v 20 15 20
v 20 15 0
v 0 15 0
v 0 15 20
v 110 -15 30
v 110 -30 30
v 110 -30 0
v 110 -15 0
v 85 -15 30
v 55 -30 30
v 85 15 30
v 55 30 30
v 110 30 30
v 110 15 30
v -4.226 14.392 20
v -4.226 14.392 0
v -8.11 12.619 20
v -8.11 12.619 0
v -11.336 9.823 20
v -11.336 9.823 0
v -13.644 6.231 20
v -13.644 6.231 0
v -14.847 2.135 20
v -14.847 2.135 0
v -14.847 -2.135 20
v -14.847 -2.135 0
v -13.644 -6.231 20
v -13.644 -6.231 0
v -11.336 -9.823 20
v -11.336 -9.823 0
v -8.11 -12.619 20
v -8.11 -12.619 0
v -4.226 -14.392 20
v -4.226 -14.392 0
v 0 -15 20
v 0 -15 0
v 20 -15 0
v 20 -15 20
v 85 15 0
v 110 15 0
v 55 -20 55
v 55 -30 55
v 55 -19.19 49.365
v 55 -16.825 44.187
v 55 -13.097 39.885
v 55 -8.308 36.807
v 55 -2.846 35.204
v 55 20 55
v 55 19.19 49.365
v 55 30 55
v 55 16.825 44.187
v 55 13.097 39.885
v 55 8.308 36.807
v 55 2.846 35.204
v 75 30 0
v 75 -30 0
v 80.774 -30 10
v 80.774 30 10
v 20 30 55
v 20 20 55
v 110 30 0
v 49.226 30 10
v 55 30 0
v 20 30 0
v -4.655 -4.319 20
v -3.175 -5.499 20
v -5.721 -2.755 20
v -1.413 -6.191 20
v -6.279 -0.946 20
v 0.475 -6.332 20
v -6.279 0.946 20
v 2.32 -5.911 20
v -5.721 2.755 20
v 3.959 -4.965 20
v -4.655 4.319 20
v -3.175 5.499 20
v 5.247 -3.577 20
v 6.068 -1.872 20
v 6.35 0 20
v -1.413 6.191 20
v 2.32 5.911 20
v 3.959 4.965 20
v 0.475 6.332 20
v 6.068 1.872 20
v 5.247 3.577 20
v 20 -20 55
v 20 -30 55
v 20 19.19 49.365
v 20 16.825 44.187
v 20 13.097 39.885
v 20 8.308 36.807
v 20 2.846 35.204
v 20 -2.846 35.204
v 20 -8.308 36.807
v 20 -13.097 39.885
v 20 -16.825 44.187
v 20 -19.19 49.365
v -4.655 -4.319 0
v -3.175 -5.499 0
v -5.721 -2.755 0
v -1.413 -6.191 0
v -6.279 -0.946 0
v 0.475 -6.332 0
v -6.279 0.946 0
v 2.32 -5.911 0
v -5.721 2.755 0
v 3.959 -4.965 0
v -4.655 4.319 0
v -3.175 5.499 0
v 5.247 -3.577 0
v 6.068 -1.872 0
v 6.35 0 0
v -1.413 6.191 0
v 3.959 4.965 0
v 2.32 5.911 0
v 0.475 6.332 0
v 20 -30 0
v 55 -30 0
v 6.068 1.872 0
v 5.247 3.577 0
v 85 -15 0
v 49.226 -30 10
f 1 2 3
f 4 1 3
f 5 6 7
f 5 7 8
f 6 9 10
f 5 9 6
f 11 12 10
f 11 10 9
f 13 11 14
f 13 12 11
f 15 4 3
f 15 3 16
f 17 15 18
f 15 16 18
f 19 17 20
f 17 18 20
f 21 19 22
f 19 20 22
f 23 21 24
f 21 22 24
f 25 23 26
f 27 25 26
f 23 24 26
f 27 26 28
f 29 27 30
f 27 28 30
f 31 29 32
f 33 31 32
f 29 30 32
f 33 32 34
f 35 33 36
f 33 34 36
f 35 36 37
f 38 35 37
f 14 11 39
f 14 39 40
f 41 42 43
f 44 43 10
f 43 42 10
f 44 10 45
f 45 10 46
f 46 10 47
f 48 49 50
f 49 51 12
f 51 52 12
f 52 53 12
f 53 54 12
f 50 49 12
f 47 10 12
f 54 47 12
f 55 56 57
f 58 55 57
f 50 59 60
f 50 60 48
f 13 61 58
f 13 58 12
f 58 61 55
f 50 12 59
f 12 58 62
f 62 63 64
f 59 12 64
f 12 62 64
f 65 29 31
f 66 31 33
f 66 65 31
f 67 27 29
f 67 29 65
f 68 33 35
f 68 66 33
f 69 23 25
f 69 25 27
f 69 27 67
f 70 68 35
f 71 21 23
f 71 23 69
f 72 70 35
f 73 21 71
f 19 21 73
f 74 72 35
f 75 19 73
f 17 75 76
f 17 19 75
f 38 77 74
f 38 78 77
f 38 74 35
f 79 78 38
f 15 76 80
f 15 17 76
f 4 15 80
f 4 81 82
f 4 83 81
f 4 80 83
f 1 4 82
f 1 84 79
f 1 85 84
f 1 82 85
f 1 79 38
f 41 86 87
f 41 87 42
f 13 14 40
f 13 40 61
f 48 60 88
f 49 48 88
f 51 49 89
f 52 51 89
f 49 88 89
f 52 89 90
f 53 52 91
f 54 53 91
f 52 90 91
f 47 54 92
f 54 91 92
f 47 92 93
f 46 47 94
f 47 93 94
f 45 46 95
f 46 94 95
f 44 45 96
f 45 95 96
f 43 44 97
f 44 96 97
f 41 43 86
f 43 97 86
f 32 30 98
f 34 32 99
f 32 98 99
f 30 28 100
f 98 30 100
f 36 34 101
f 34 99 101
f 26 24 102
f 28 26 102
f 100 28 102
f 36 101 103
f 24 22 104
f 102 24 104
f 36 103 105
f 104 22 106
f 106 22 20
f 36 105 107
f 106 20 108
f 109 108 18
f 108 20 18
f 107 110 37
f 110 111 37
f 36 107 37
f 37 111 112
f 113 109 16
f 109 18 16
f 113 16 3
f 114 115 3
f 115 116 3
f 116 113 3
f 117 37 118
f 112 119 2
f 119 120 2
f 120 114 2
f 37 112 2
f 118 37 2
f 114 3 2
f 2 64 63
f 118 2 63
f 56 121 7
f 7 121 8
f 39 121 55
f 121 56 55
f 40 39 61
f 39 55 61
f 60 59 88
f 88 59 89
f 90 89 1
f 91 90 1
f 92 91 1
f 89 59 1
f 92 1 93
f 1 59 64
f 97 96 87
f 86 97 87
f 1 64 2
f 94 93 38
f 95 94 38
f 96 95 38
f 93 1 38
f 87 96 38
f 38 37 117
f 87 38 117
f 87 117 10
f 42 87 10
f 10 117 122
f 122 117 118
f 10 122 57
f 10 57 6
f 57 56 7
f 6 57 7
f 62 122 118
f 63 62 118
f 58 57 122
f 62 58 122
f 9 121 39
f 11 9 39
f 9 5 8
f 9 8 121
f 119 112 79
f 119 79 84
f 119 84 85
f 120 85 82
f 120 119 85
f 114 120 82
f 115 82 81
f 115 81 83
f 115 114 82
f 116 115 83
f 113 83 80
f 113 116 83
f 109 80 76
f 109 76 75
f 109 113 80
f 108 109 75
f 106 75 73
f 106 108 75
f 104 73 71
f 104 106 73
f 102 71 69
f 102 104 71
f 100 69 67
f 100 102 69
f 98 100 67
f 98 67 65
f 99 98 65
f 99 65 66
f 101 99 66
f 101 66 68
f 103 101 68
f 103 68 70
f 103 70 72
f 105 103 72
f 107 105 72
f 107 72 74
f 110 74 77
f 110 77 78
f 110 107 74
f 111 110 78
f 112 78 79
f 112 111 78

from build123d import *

# Parameters (mm, degrees)
F0_R     = 6.35
F1_DEPTH = 20
F2_DEPTH = 30
F3_DEPTH = 55
F5_DEPTH = 90.001
F7_DEPTH = 60.001


with BuildPart() as f1:
    # F0 (on Top) → F1 (new body)
    with BuildSketch(Plane.XY):
        with BuildLine():
            Line((20, -15), (20, 15))
            Line((20, 15), (0, 15))
            ThreePointArc((0, 15), (-15, 0), (0, -15))
            Line((0, -15), (20, -15))
        make_face()
        Circle(F0_R, mode=Mode.SUBTRACT)
    extrude(amount=F1_DEPTH)

    # F0 (on Top) → F2 (join)
    with BuildSketch(Plane.XY):
        Polygon((110, 30), (55, 30), (55, -30), (110, -30), (110, -15), (85, -15), (85, 15), (110, 15), align=None)
        Polygon((55, 30), (20, 30), (20, 15), (20, -15), (20, -30), (55, -30), align=None)
    extrude(amount=F2_DEPTH)

    # F0 (on Top) → F3 (join)
    with BuildSketch(Plane.XY):
        Polygon((55, 30), (20, 30), (20, 15), (20, -15), (20, -30), (55, -30), align=None)
    extrude(amount=F3_DEPTH)

    # F4 (on face) → F5 (cut, through all)
    with BuildSketch(Plane(origin=(20, 0, 0), x_dir=(0, -1, 0), z_dir=(-1, 0, 0))):
        with BuildLine():
            Line((20, 55), (-20, 55))
            ThreePointArc((-20, 55), (0, 35), (20, 55))
        make_face()
    extrude(amount=-F5_DEPTH, mode=Mode.SUBTRACT)

    # F6 (on face) → F7 (cut, through all)
    with BuildSketch(Plane.XZ.offset(30)):
        Polygon((49.226497, 10), (55, 0), (75, 0), (80.773503, 10), align=None)
    extrude(amount=-F7_DEPTH, mode=Mode.SUBTRACT)


solid = f1.part
